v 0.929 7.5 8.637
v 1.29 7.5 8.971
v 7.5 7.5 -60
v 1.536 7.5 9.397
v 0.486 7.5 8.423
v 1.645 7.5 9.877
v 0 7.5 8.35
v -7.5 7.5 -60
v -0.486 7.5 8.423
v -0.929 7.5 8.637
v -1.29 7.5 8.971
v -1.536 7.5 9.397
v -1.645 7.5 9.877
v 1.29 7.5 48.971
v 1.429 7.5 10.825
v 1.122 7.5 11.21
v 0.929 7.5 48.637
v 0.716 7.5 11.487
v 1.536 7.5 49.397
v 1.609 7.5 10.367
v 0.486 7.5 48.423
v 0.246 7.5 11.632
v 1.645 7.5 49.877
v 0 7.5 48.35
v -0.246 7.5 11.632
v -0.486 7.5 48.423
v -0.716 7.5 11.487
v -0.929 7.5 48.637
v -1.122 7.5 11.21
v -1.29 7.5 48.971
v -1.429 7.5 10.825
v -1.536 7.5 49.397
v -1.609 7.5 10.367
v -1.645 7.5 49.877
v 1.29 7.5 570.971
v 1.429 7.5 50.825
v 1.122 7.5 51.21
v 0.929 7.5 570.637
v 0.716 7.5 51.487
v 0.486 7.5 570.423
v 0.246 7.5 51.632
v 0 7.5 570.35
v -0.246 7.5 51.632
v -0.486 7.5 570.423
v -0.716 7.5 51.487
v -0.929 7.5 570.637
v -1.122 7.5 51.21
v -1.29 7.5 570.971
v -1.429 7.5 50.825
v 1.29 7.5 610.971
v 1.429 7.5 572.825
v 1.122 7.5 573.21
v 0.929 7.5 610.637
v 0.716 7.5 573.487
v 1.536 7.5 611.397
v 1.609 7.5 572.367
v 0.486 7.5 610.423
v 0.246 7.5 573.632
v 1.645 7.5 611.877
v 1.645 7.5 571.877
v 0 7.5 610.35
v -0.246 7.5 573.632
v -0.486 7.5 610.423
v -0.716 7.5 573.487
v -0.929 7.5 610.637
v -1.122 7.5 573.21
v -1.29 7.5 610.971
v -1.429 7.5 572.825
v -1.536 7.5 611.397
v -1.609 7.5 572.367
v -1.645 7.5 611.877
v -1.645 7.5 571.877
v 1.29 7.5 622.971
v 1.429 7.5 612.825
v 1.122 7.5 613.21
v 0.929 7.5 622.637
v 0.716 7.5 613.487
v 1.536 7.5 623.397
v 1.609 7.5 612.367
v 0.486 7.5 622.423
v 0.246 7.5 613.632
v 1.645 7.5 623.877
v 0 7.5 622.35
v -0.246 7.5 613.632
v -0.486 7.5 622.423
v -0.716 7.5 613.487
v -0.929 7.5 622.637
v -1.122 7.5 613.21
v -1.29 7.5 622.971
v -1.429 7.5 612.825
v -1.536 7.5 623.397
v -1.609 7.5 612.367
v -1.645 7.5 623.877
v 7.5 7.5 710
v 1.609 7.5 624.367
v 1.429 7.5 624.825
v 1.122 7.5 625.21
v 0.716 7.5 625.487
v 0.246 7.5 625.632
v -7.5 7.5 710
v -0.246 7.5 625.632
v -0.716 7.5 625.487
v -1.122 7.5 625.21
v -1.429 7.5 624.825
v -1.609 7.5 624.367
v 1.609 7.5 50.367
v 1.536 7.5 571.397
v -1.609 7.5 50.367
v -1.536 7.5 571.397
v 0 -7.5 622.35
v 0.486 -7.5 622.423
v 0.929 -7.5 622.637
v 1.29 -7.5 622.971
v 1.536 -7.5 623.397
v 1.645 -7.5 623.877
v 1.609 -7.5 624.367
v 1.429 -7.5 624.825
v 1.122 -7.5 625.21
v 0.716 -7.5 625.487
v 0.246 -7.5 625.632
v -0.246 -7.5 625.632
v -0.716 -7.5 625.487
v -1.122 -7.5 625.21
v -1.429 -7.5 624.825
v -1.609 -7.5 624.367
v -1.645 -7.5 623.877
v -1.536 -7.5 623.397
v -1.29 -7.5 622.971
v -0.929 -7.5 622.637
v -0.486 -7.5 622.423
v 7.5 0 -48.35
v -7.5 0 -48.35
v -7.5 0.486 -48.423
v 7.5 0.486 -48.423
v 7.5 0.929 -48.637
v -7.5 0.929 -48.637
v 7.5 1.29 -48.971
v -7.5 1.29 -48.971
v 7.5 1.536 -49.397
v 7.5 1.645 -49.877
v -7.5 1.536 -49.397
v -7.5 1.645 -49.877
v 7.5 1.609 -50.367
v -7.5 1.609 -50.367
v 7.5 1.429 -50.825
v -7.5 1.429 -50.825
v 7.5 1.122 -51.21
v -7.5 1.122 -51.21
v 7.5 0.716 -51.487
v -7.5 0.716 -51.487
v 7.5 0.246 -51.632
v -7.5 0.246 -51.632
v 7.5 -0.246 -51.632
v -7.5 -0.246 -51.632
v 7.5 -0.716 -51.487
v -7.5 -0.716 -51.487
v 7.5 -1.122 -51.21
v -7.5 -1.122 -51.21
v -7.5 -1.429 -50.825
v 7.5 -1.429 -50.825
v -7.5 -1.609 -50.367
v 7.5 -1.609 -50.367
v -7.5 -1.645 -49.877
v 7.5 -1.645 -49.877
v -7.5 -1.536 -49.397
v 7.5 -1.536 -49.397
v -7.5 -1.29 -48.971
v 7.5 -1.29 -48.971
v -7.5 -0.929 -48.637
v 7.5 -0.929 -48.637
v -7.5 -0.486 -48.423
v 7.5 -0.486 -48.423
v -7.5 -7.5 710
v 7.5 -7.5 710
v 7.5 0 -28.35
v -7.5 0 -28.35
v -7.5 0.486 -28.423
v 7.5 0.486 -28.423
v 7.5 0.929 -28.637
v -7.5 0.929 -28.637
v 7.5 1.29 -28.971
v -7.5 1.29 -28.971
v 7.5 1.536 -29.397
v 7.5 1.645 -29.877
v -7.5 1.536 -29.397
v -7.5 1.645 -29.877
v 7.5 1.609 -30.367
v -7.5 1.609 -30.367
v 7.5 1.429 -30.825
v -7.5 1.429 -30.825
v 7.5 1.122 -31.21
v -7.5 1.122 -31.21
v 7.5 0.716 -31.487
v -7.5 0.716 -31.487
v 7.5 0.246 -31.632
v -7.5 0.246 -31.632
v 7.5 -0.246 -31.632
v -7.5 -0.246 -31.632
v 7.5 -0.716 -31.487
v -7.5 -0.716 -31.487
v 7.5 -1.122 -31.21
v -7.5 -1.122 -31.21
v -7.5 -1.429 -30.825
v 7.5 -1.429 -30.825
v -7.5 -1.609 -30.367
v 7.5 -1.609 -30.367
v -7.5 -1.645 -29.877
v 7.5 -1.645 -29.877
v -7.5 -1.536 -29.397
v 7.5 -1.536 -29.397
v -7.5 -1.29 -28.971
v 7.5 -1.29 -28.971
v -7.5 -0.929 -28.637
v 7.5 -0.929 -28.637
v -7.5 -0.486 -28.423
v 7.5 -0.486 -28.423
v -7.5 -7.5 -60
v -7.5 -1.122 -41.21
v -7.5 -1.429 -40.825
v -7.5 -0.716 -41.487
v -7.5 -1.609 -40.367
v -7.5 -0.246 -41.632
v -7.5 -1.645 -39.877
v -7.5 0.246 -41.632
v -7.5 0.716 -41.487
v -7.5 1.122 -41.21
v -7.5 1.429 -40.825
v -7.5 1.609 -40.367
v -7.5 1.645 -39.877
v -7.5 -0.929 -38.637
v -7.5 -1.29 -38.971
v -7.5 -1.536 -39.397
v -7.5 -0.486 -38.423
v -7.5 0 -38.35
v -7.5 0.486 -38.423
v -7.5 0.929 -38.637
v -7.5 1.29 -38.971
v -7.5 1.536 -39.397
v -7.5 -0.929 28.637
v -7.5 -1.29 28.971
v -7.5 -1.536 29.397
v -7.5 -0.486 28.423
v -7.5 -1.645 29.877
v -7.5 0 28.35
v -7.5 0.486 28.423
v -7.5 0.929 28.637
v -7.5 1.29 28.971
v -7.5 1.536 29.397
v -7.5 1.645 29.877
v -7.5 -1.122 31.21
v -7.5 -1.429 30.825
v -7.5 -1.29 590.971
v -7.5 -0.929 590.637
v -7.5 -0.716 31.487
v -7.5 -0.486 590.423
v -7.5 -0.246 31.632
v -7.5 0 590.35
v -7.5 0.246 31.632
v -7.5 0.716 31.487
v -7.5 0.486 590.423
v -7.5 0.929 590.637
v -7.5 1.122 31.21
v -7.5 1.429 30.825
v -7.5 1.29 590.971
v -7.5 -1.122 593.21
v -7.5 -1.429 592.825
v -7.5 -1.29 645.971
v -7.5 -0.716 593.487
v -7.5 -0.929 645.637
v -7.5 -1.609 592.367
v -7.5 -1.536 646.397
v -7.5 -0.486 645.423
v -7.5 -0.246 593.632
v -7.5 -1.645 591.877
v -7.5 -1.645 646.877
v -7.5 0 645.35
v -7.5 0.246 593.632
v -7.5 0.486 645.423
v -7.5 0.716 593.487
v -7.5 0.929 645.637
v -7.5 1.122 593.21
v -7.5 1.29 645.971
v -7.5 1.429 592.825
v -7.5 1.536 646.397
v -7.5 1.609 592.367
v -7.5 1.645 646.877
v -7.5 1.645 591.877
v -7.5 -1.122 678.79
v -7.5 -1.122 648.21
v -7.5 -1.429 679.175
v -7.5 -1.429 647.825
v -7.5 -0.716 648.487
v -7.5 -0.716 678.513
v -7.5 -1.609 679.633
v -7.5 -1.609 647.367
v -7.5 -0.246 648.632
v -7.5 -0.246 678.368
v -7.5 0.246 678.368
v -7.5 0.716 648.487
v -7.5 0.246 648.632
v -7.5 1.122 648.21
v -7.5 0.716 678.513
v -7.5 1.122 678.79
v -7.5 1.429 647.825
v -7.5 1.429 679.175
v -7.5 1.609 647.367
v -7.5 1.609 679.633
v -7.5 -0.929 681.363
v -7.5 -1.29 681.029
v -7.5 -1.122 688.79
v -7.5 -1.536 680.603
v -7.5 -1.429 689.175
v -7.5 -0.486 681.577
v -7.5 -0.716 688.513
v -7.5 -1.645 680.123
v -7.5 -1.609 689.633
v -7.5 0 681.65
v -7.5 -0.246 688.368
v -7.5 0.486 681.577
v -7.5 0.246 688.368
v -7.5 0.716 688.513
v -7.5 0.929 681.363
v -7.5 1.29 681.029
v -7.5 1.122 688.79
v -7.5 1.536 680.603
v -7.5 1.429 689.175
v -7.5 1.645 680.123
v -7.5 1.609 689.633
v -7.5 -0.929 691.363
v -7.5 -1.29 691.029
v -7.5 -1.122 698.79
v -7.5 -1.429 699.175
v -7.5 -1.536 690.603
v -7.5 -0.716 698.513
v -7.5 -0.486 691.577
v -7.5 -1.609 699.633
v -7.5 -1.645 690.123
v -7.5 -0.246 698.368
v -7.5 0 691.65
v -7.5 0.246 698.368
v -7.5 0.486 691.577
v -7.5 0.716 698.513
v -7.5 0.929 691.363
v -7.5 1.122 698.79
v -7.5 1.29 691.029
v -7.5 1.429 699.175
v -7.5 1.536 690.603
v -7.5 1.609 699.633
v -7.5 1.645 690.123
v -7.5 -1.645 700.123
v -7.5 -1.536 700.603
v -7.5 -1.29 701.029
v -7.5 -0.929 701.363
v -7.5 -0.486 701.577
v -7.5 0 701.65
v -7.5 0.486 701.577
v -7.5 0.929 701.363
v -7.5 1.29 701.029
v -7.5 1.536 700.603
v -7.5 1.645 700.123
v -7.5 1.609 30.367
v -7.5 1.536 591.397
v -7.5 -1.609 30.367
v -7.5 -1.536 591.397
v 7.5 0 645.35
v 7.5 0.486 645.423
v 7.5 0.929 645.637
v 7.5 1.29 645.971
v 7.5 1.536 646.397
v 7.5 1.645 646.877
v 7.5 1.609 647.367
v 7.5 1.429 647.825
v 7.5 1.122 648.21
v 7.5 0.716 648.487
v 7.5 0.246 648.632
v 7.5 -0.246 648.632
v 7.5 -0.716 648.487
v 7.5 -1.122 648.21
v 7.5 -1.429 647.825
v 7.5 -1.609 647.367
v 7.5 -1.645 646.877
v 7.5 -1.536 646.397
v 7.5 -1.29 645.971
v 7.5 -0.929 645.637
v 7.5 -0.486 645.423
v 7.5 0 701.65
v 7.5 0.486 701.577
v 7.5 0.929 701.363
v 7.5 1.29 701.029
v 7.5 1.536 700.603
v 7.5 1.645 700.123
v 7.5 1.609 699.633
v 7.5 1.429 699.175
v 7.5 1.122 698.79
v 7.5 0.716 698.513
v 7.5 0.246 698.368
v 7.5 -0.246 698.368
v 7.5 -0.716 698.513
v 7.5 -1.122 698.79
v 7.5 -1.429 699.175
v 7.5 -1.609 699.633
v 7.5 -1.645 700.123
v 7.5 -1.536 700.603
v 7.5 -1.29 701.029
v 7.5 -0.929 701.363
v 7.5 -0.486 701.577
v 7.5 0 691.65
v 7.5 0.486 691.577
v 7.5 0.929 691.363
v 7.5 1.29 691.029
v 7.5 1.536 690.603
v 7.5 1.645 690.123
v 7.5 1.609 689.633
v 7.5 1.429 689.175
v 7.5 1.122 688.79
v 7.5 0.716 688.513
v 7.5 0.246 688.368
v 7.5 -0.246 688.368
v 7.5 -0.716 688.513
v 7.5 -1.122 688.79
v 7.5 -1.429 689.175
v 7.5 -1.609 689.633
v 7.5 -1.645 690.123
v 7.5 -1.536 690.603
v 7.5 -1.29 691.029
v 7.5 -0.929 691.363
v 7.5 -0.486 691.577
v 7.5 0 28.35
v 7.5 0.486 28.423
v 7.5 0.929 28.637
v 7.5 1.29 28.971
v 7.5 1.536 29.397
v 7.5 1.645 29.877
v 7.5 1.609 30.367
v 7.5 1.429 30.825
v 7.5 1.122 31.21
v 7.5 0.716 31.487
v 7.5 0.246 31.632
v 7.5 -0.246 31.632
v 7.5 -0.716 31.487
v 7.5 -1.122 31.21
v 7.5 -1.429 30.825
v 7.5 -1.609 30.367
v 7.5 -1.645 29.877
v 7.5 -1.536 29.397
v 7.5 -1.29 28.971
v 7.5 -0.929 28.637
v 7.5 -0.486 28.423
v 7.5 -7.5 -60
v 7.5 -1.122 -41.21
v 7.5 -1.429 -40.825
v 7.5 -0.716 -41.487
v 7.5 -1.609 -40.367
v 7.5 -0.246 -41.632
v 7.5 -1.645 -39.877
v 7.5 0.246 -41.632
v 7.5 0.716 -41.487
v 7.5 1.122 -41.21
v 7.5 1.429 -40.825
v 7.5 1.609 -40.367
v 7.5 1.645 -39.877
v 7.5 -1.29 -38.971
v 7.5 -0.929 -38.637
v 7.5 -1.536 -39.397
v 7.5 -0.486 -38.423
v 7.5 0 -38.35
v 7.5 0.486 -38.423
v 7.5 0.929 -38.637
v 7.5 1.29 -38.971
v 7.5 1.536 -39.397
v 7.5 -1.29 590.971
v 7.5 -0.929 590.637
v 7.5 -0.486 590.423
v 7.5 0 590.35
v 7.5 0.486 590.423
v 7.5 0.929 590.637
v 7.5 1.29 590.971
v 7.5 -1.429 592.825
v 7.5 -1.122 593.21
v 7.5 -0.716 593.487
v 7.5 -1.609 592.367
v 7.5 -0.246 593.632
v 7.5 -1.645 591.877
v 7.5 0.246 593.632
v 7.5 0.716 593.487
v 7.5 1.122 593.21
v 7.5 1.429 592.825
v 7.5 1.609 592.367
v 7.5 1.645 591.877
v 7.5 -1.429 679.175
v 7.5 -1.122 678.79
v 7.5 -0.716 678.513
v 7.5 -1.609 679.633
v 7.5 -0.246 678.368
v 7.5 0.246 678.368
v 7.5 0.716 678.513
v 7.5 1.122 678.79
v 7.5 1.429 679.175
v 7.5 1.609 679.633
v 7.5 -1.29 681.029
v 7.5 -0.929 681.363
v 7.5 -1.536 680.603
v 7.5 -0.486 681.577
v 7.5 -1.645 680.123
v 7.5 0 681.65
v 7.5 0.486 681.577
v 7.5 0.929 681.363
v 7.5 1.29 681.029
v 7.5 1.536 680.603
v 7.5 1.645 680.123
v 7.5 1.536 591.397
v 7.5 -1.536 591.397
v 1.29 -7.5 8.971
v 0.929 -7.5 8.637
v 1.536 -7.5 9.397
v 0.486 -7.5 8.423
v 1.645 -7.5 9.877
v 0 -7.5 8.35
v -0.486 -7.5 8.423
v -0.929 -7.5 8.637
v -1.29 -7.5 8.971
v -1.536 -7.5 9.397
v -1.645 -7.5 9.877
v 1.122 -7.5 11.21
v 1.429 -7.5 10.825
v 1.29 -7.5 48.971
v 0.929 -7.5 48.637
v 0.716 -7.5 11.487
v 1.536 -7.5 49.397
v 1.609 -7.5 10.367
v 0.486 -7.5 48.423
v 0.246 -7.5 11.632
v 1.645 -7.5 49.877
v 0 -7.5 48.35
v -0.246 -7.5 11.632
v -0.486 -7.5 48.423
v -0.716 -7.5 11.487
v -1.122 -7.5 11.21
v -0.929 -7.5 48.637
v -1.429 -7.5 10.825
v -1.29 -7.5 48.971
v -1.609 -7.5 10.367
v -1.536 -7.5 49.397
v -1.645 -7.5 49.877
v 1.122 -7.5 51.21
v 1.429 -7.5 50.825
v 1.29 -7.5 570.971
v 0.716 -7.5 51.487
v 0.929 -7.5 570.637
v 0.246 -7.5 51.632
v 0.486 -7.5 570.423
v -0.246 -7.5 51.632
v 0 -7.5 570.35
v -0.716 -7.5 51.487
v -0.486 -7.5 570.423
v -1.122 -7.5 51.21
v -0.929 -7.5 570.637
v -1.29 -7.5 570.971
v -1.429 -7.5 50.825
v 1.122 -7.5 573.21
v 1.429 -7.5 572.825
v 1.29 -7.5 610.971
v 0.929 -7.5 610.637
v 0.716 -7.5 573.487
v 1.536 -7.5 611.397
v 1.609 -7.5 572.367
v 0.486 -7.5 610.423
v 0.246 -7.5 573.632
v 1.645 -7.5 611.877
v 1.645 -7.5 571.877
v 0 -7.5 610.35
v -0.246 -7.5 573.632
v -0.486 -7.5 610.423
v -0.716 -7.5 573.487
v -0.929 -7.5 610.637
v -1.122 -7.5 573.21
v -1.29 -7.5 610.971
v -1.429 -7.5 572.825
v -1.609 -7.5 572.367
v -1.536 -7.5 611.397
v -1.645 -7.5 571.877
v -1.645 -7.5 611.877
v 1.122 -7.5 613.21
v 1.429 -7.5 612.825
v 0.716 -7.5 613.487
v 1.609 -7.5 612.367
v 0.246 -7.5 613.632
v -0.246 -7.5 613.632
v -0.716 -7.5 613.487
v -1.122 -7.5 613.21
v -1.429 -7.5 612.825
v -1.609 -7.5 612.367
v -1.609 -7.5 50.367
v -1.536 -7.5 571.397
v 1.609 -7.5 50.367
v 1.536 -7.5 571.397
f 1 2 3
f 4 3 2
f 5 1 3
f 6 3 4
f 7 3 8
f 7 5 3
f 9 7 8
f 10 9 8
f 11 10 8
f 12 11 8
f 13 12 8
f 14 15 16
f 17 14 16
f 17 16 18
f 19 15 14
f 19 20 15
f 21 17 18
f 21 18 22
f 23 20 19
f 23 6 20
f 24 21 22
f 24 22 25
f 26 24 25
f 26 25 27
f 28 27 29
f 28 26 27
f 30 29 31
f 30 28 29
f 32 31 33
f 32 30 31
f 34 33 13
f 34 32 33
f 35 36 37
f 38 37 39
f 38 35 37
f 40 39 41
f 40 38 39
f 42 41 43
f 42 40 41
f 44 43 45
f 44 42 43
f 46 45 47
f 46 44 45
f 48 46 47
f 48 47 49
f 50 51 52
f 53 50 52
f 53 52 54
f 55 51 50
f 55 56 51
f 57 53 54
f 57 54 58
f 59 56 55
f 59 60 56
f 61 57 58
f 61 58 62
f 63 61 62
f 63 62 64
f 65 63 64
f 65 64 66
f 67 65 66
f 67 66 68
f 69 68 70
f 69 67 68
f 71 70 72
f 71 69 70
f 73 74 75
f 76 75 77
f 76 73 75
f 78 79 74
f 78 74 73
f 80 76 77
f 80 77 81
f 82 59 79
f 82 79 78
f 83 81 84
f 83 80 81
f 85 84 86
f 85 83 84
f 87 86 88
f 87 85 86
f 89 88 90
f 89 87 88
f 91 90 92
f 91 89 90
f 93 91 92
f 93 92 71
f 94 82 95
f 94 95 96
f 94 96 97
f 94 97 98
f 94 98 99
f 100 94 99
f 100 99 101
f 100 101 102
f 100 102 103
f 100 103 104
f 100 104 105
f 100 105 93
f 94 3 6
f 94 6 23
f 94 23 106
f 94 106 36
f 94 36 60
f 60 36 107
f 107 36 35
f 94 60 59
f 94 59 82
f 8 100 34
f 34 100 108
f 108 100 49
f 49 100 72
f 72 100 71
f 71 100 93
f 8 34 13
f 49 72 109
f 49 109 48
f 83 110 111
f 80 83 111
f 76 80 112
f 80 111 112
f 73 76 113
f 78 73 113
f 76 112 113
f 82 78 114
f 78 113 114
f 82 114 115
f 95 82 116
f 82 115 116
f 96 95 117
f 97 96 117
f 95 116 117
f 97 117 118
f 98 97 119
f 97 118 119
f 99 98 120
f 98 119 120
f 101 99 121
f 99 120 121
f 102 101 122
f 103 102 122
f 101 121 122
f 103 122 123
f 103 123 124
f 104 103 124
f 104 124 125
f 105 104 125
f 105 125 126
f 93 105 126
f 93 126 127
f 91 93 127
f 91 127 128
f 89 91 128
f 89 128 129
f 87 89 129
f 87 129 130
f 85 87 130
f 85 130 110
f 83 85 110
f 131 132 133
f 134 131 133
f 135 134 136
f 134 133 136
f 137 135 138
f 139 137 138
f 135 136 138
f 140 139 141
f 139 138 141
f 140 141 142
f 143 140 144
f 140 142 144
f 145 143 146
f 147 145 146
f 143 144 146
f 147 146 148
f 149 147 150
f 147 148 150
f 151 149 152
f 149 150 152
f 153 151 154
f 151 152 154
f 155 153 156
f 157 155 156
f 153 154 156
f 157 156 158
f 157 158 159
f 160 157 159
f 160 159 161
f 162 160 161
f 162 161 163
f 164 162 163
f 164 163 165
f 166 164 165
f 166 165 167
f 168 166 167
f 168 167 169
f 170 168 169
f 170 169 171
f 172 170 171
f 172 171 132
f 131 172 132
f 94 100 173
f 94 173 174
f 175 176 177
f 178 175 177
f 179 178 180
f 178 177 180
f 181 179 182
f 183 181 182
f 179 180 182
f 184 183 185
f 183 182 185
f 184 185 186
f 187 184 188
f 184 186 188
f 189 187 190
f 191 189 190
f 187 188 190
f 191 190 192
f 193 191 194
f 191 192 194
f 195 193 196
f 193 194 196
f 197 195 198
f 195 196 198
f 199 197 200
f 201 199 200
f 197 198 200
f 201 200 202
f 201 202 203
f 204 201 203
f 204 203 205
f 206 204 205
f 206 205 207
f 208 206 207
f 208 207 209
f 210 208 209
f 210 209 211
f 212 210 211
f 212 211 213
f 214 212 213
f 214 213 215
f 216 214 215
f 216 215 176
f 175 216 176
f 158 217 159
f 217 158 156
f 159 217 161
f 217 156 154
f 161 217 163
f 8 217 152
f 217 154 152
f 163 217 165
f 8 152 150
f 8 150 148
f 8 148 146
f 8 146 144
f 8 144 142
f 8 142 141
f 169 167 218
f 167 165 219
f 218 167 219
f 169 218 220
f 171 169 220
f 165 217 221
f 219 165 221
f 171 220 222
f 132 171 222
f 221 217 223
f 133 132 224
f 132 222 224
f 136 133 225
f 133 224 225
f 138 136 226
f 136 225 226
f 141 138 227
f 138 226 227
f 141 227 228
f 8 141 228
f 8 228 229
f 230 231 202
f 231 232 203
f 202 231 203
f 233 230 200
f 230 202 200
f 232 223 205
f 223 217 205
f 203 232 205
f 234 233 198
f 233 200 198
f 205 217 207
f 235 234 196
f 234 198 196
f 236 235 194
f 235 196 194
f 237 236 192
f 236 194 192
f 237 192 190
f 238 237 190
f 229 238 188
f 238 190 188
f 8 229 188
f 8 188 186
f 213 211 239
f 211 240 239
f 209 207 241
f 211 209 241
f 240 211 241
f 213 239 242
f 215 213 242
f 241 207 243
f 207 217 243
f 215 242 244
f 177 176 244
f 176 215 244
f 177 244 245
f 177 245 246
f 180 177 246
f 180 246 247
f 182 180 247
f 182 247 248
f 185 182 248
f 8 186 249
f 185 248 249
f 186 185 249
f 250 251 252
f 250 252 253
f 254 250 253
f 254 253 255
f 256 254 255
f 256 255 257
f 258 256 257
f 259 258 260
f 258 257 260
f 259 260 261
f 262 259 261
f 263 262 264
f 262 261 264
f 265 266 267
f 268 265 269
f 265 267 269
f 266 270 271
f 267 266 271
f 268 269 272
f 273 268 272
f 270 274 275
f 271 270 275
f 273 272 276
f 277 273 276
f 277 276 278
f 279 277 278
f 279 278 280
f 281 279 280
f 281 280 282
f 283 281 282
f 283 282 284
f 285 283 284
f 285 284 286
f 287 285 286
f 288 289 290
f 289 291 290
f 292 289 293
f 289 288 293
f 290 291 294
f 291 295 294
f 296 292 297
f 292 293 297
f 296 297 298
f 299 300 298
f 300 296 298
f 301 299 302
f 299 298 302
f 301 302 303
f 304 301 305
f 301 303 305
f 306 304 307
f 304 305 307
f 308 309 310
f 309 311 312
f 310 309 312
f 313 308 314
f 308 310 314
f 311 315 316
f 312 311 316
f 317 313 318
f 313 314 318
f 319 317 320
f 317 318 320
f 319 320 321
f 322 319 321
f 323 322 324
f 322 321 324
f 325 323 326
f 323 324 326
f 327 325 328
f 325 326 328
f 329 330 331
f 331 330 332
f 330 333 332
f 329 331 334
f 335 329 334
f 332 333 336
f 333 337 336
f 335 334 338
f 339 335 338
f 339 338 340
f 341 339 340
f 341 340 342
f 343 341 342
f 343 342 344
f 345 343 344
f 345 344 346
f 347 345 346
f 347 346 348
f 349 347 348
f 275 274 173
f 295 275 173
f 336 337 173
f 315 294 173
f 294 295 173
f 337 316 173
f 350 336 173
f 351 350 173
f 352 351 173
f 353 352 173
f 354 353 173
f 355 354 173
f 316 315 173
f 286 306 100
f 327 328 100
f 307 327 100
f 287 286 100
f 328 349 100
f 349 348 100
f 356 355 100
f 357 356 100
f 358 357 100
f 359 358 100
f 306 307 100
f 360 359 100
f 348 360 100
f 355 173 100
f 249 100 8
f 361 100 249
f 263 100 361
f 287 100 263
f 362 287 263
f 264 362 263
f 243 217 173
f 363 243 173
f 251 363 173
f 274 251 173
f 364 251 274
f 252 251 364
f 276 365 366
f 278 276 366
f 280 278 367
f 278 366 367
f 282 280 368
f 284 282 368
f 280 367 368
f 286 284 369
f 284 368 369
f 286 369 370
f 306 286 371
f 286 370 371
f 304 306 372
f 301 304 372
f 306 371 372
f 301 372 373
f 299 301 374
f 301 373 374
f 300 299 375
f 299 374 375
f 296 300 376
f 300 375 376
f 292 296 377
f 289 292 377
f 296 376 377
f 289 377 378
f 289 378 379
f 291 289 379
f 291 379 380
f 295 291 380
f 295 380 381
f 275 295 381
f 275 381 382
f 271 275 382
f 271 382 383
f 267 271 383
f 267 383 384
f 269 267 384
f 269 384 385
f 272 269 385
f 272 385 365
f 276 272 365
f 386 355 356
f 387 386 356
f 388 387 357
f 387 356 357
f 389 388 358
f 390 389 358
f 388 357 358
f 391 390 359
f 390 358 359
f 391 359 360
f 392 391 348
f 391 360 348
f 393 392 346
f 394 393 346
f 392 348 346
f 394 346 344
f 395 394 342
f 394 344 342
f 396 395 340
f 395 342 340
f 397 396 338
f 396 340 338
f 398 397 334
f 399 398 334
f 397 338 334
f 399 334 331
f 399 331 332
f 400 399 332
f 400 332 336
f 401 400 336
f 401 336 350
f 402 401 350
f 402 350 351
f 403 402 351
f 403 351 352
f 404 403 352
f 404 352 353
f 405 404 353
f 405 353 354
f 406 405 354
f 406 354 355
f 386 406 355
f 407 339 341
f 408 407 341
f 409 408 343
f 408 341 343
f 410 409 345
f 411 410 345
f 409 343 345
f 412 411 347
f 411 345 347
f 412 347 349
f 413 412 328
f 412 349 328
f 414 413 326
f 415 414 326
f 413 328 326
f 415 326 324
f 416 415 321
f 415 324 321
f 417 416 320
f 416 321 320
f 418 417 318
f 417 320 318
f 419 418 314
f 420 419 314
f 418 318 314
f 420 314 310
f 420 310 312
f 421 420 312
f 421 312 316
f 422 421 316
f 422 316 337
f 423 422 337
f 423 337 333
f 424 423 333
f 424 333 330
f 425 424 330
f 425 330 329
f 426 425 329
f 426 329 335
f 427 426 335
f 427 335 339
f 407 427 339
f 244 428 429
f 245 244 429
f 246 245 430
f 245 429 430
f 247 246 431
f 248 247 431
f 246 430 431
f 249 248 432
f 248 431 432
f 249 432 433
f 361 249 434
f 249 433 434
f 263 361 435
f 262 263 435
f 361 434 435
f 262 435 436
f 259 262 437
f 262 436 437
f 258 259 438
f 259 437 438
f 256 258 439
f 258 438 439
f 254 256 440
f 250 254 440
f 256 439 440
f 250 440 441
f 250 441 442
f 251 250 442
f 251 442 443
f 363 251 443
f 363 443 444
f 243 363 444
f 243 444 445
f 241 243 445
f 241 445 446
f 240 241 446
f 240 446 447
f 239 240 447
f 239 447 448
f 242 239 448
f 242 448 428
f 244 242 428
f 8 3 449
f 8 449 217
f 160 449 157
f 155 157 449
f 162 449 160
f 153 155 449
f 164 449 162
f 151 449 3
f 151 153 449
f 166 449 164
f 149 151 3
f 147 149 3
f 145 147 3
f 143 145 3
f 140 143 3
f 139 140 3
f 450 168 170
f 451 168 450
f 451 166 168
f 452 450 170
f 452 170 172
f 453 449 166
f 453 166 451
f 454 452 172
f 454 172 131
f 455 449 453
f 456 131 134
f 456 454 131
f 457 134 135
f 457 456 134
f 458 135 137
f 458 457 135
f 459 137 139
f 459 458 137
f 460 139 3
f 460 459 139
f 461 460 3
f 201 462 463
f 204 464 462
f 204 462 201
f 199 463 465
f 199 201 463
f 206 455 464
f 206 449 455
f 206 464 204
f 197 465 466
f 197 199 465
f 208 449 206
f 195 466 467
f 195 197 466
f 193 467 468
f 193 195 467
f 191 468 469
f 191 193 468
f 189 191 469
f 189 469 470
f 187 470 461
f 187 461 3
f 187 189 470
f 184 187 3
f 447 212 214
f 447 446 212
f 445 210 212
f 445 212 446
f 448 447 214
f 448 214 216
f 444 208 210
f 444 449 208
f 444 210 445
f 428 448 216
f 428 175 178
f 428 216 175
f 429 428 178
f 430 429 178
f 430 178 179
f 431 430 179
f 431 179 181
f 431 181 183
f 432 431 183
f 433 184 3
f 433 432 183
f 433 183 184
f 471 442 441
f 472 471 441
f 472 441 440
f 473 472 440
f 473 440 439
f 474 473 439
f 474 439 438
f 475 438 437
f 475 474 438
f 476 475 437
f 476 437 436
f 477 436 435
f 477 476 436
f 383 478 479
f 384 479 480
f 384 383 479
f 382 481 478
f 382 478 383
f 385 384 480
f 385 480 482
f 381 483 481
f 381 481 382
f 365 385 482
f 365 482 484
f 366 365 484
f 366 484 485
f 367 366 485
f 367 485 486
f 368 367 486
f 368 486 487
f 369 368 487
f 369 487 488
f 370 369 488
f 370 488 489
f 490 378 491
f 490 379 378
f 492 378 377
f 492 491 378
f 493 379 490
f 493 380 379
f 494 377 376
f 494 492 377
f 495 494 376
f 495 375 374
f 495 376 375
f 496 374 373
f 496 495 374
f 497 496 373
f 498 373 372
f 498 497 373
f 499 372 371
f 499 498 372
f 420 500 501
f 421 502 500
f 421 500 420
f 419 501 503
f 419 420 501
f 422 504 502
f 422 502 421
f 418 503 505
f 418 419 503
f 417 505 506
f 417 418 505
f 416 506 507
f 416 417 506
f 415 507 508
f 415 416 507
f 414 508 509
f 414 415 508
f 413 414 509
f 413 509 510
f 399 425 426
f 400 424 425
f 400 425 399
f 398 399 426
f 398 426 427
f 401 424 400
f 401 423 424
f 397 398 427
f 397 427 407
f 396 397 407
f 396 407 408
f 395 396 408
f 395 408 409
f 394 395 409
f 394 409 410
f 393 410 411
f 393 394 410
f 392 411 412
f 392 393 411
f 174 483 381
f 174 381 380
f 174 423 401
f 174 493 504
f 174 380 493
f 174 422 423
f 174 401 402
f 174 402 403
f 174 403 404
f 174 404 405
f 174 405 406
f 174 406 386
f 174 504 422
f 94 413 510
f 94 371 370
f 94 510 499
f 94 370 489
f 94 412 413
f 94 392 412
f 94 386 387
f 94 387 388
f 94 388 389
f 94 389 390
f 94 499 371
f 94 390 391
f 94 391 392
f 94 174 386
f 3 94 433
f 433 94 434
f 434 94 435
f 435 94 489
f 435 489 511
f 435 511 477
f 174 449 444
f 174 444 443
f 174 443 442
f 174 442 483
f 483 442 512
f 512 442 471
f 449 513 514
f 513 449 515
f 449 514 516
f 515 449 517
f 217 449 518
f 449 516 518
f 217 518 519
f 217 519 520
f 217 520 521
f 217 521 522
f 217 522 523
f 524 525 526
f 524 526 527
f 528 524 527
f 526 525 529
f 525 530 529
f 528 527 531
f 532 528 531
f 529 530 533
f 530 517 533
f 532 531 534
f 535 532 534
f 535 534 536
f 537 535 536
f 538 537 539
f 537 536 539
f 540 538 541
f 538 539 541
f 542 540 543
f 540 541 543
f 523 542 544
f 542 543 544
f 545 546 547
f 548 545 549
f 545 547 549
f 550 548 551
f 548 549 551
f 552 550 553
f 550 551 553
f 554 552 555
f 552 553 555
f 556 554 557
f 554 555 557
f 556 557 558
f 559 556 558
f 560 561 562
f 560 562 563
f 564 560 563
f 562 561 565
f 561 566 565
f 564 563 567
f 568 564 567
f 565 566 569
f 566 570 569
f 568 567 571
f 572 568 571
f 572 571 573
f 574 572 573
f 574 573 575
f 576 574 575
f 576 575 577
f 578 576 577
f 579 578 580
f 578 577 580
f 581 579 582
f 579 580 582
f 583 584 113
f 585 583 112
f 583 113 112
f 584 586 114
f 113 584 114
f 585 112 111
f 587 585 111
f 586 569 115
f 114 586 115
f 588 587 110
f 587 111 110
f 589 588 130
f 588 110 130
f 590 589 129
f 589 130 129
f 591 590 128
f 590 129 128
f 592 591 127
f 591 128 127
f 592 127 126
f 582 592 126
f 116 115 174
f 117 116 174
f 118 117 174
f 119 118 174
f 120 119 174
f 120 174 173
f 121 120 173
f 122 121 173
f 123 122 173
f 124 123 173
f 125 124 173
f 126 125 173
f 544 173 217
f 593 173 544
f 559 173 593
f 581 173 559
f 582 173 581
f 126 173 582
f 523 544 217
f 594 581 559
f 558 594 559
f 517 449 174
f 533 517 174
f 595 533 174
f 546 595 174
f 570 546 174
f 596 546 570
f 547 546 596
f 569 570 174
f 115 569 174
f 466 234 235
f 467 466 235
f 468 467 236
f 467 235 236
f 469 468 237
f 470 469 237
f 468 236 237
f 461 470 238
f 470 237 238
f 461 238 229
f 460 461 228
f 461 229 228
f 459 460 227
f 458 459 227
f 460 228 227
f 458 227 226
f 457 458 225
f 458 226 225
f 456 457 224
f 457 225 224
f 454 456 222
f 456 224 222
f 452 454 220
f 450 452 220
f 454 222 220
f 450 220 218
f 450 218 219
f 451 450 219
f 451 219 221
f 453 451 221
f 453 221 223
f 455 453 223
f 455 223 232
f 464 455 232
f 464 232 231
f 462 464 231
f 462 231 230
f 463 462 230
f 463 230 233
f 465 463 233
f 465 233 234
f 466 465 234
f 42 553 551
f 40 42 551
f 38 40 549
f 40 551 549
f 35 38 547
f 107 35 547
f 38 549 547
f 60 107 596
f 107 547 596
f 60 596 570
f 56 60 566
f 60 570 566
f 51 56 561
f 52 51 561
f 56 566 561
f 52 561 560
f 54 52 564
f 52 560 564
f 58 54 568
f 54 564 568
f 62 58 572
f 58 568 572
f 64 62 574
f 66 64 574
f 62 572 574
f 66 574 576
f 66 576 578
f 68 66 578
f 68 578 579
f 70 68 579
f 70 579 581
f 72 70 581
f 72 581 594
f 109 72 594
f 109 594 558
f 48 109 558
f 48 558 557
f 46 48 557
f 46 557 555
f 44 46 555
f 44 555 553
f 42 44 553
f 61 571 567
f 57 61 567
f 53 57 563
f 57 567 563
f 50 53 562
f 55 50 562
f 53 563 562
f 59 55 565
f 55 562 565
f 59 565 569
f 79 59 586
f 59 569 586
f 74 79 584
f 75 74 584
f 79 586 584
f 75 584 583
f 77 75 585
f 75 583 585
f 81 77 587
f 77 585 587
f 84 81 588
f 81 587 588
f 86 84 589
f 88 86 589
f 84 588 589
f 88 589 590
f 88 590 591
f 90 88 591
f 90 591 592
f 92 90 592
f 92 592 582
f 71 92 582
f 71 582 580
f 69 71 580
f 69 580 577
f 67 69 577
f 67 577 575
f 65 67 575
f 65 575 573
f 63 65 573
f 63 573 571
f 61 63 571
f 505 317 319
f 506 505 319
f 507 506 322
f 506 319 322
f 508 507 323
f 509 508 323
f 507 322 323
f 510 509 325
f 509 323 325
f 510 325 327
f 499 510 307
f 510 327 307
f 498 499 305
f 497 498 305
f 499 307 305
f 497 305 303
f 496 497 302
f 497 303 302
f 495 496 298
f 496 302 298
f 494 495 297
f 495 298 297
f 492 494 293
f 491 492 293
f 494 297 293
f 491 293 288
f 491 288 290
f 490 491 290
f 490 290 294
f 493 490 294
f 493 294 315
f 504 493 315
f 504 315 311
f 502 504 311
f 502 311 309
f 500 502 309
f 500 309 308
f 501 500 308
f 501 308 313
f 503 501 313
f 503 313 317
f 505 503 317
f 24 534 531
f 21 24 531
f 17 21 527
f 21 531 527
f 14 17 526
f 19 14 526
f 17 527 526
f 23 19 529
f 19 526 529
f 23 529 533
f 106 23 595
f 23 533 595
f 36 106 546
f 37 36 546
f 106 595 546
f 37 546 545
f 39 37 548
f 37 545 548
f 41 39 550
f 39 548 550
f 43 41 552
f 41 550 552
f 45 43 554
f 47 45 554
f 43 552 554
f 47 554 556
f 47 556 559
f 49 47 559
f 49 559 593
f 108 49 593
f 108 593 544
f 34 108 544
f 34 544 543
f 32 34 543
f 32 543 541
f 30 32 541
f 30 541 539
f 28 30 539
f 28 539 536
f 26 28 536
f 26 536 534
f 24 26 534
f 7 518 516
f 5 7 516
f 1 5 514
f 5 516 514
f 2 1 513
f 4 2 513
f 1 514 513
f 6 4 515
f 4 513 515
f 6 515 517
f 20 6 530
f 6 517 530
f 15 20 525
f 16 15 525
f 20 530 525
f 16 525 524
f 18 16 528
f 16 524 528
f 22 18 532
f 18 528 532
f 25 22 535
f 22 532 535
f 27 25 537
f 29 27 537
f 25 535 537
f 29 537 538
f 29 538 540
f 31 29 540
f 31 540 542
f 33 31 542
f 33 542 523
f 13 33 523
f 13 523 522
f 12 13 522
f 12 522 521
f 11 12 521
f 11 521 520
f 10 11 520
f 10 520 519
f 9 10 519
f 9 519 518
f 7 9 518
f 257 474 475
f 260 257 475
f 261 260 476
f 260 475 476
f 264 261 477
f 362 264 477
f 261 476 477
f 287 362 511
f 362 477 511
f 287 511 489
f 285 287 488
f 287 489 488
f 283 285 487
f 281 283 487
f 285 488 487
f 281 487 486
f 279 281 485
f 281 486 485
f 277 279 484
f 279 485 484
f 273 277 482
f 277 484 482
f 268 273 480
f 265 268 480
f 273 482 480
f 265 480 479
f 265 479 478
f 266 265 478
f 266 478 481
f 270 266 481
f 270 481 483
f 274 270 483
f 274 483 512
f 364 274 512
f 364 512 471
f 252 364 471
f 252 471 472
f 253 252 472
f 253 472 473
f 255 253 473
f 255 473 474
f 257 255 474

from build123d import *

# Parameters (mm, degrees)
SKETCH_1_W          = 15
SKETCH_1_H          = 15
EXTRUDE_1_DEPTH     = 657
SKETCH_2_R          = 1.65
CUT_EXTRUDE_1_DEPTH = 1000
SKETCH_4_R          = 1.65
CUT_EXTRUDE_2_DEPTH = 20
SKETCH_5_W          = 15
SKETCH_5_H          = 15
EXTRUDE_2_DEPTH     = 20
SKETCH_6_W          = 15
SKETCH_6_H          = 15
EXTRUDE_3_DEPTH     = 23
SKETCH_7_W          = 15
SKETCH_7_H          = 15
EXTRUDE_4_DEPTH     = 30
SKETCH_8_W          = 15
SKETCH_8_H          = 15
EXTRUDE_5_DEPTH     = 30
SKETCH_9_W          = 15
SKETCH_9_H          = 15
EXTRUDE_6_DEPTH     = 10
SKETCH_10_R         = 1.65
CUT_EXTRUDE_3_DEPTH = 20


with BuildPart() as part:
    # 草图1 → 凸台-拉伸1 (new body)
    with BuildSketch(Plane.XY):
        Rectangle(SKETCH_1_W, SKETCH_1_H)
    extrude(amount=EXTRUDE_1_DEPTH)

    # 草图2 → 切除-拉伸1 (cut)
    with BuildSketch(Plane.XZ.offset(7.5)):
        with Locations(Location((0, 624, 0), (0, 0, 270))):
            Circle(SKETCH_2_R)
        with Locations(Location((0, 612, 0), (0, 0, 270))):
            Circle(SKETCH_2_R)
        with Locations(Location((0, 572, 0), (0, 0, 270))):
            Circle(SKETCH_2_R)
        with Locations(Location((0, 10, 0), (0, 0, 270))):
            Circle(SKETCH_2_R)
        with Locations(Location((0, 50, 0), (0, 0, 270))):
            Circle(SKETCH_2_R)
    extrude(amount=-CUT_EXTRUDE_1_DEPTH, mode=Mode.SUBTRACT)

    # 草图4 → 切除-拉伸2 (cut)
    with BuildSketch(Plane(origin=(7.5, 0, 0), x_dir=(0, 0, -1), z_dir=(1, 0, 0))):
        with Locations((-647, 0)):
            Circle(SKETCH_4_R)
        with Locations((-592, 0)):
            Circle(SKETCH_4_R)
        with Locations((-30, 0)):
            Circle(SKETCH_4_R)
    extrude(amount=-CUT_EXTRUDE_2_DEPTH, mode=Mode.SUBTRACT)

    # 草图5 → 凸台-拉伸2 (add)
    with BuildSketch(Plane(origin=(0, 0, 0), x_dir=(-1, 0, 0), z_dir=(0, 0, -1))):
        Rectangle(SKETCH_5_W, SKETCH_5_H)
    extrude(amount=EXTRUDE_2_DEPTH)

    # 草图6 → 凸台-拉伸3 (add)
    with BuildSketch(Plane.XY.offset(657)):
        Rectangle(SKETCH_6_W, SKETCH_6_H)
    extrude(amount=EXTRUDE_3_DEPTH)

    # 草图7 → 凸台-拉伸4 (add)
    with BuildSketch(Plane.XY.offset(680)):
        Rectangle(SKETCH_7_W, SKETCH_7_H)
    extrude(amount=EXTRUDE_4_DEPTH)

    # 草图8 → 凸台-拉伸5 (add)
    with BuildSketch(Plane(origin=(0, 0, -20), x_dir=(-1, 0, 0), z_dir=(0, 0, -1))):
        Rectangle(SKETCH_8_W, SKETCH_8_H)
    extrude(amount=EXTRUDE_5_DEPTH)

    # 草图9 → 凸台-拉伸6 (add)
    with BuildSketch(Plane(origin=(0, 0, -50), x_dir=(-1, 0, 0), z_dir=(0, 0, -1))):
        Rectangle(SKETCH_9_W, SKETCH_9_H)
    extrude(amount=EXTRUDE_6_DEPTH)

    # 草图10 → 切除-拉伸3 (cut)
    with BuildSketch(Plane.ZY.offset(7.5)):
        with Locations((-50, 0)):
            Circle(SKETCH_10_R)
        with Locations((-40, 0)):
            Circle(SKETCH_10_R)
        with Locations((-30, 0)):
            Circle(SKETCH_10_R)
        with Locations((680, 0)):
            Circle(SKETCH_10_R)
        with Locations((690, 0)):
            Circle(SKETCH_10_R)
        with Locations((700, 0)):
            Circle(SKETCH_10_R)
    extrude(amount=-CUT_EXTRUDE_3_DEPTH, mode=Mode.SUBTRACT)


solid = part.part
